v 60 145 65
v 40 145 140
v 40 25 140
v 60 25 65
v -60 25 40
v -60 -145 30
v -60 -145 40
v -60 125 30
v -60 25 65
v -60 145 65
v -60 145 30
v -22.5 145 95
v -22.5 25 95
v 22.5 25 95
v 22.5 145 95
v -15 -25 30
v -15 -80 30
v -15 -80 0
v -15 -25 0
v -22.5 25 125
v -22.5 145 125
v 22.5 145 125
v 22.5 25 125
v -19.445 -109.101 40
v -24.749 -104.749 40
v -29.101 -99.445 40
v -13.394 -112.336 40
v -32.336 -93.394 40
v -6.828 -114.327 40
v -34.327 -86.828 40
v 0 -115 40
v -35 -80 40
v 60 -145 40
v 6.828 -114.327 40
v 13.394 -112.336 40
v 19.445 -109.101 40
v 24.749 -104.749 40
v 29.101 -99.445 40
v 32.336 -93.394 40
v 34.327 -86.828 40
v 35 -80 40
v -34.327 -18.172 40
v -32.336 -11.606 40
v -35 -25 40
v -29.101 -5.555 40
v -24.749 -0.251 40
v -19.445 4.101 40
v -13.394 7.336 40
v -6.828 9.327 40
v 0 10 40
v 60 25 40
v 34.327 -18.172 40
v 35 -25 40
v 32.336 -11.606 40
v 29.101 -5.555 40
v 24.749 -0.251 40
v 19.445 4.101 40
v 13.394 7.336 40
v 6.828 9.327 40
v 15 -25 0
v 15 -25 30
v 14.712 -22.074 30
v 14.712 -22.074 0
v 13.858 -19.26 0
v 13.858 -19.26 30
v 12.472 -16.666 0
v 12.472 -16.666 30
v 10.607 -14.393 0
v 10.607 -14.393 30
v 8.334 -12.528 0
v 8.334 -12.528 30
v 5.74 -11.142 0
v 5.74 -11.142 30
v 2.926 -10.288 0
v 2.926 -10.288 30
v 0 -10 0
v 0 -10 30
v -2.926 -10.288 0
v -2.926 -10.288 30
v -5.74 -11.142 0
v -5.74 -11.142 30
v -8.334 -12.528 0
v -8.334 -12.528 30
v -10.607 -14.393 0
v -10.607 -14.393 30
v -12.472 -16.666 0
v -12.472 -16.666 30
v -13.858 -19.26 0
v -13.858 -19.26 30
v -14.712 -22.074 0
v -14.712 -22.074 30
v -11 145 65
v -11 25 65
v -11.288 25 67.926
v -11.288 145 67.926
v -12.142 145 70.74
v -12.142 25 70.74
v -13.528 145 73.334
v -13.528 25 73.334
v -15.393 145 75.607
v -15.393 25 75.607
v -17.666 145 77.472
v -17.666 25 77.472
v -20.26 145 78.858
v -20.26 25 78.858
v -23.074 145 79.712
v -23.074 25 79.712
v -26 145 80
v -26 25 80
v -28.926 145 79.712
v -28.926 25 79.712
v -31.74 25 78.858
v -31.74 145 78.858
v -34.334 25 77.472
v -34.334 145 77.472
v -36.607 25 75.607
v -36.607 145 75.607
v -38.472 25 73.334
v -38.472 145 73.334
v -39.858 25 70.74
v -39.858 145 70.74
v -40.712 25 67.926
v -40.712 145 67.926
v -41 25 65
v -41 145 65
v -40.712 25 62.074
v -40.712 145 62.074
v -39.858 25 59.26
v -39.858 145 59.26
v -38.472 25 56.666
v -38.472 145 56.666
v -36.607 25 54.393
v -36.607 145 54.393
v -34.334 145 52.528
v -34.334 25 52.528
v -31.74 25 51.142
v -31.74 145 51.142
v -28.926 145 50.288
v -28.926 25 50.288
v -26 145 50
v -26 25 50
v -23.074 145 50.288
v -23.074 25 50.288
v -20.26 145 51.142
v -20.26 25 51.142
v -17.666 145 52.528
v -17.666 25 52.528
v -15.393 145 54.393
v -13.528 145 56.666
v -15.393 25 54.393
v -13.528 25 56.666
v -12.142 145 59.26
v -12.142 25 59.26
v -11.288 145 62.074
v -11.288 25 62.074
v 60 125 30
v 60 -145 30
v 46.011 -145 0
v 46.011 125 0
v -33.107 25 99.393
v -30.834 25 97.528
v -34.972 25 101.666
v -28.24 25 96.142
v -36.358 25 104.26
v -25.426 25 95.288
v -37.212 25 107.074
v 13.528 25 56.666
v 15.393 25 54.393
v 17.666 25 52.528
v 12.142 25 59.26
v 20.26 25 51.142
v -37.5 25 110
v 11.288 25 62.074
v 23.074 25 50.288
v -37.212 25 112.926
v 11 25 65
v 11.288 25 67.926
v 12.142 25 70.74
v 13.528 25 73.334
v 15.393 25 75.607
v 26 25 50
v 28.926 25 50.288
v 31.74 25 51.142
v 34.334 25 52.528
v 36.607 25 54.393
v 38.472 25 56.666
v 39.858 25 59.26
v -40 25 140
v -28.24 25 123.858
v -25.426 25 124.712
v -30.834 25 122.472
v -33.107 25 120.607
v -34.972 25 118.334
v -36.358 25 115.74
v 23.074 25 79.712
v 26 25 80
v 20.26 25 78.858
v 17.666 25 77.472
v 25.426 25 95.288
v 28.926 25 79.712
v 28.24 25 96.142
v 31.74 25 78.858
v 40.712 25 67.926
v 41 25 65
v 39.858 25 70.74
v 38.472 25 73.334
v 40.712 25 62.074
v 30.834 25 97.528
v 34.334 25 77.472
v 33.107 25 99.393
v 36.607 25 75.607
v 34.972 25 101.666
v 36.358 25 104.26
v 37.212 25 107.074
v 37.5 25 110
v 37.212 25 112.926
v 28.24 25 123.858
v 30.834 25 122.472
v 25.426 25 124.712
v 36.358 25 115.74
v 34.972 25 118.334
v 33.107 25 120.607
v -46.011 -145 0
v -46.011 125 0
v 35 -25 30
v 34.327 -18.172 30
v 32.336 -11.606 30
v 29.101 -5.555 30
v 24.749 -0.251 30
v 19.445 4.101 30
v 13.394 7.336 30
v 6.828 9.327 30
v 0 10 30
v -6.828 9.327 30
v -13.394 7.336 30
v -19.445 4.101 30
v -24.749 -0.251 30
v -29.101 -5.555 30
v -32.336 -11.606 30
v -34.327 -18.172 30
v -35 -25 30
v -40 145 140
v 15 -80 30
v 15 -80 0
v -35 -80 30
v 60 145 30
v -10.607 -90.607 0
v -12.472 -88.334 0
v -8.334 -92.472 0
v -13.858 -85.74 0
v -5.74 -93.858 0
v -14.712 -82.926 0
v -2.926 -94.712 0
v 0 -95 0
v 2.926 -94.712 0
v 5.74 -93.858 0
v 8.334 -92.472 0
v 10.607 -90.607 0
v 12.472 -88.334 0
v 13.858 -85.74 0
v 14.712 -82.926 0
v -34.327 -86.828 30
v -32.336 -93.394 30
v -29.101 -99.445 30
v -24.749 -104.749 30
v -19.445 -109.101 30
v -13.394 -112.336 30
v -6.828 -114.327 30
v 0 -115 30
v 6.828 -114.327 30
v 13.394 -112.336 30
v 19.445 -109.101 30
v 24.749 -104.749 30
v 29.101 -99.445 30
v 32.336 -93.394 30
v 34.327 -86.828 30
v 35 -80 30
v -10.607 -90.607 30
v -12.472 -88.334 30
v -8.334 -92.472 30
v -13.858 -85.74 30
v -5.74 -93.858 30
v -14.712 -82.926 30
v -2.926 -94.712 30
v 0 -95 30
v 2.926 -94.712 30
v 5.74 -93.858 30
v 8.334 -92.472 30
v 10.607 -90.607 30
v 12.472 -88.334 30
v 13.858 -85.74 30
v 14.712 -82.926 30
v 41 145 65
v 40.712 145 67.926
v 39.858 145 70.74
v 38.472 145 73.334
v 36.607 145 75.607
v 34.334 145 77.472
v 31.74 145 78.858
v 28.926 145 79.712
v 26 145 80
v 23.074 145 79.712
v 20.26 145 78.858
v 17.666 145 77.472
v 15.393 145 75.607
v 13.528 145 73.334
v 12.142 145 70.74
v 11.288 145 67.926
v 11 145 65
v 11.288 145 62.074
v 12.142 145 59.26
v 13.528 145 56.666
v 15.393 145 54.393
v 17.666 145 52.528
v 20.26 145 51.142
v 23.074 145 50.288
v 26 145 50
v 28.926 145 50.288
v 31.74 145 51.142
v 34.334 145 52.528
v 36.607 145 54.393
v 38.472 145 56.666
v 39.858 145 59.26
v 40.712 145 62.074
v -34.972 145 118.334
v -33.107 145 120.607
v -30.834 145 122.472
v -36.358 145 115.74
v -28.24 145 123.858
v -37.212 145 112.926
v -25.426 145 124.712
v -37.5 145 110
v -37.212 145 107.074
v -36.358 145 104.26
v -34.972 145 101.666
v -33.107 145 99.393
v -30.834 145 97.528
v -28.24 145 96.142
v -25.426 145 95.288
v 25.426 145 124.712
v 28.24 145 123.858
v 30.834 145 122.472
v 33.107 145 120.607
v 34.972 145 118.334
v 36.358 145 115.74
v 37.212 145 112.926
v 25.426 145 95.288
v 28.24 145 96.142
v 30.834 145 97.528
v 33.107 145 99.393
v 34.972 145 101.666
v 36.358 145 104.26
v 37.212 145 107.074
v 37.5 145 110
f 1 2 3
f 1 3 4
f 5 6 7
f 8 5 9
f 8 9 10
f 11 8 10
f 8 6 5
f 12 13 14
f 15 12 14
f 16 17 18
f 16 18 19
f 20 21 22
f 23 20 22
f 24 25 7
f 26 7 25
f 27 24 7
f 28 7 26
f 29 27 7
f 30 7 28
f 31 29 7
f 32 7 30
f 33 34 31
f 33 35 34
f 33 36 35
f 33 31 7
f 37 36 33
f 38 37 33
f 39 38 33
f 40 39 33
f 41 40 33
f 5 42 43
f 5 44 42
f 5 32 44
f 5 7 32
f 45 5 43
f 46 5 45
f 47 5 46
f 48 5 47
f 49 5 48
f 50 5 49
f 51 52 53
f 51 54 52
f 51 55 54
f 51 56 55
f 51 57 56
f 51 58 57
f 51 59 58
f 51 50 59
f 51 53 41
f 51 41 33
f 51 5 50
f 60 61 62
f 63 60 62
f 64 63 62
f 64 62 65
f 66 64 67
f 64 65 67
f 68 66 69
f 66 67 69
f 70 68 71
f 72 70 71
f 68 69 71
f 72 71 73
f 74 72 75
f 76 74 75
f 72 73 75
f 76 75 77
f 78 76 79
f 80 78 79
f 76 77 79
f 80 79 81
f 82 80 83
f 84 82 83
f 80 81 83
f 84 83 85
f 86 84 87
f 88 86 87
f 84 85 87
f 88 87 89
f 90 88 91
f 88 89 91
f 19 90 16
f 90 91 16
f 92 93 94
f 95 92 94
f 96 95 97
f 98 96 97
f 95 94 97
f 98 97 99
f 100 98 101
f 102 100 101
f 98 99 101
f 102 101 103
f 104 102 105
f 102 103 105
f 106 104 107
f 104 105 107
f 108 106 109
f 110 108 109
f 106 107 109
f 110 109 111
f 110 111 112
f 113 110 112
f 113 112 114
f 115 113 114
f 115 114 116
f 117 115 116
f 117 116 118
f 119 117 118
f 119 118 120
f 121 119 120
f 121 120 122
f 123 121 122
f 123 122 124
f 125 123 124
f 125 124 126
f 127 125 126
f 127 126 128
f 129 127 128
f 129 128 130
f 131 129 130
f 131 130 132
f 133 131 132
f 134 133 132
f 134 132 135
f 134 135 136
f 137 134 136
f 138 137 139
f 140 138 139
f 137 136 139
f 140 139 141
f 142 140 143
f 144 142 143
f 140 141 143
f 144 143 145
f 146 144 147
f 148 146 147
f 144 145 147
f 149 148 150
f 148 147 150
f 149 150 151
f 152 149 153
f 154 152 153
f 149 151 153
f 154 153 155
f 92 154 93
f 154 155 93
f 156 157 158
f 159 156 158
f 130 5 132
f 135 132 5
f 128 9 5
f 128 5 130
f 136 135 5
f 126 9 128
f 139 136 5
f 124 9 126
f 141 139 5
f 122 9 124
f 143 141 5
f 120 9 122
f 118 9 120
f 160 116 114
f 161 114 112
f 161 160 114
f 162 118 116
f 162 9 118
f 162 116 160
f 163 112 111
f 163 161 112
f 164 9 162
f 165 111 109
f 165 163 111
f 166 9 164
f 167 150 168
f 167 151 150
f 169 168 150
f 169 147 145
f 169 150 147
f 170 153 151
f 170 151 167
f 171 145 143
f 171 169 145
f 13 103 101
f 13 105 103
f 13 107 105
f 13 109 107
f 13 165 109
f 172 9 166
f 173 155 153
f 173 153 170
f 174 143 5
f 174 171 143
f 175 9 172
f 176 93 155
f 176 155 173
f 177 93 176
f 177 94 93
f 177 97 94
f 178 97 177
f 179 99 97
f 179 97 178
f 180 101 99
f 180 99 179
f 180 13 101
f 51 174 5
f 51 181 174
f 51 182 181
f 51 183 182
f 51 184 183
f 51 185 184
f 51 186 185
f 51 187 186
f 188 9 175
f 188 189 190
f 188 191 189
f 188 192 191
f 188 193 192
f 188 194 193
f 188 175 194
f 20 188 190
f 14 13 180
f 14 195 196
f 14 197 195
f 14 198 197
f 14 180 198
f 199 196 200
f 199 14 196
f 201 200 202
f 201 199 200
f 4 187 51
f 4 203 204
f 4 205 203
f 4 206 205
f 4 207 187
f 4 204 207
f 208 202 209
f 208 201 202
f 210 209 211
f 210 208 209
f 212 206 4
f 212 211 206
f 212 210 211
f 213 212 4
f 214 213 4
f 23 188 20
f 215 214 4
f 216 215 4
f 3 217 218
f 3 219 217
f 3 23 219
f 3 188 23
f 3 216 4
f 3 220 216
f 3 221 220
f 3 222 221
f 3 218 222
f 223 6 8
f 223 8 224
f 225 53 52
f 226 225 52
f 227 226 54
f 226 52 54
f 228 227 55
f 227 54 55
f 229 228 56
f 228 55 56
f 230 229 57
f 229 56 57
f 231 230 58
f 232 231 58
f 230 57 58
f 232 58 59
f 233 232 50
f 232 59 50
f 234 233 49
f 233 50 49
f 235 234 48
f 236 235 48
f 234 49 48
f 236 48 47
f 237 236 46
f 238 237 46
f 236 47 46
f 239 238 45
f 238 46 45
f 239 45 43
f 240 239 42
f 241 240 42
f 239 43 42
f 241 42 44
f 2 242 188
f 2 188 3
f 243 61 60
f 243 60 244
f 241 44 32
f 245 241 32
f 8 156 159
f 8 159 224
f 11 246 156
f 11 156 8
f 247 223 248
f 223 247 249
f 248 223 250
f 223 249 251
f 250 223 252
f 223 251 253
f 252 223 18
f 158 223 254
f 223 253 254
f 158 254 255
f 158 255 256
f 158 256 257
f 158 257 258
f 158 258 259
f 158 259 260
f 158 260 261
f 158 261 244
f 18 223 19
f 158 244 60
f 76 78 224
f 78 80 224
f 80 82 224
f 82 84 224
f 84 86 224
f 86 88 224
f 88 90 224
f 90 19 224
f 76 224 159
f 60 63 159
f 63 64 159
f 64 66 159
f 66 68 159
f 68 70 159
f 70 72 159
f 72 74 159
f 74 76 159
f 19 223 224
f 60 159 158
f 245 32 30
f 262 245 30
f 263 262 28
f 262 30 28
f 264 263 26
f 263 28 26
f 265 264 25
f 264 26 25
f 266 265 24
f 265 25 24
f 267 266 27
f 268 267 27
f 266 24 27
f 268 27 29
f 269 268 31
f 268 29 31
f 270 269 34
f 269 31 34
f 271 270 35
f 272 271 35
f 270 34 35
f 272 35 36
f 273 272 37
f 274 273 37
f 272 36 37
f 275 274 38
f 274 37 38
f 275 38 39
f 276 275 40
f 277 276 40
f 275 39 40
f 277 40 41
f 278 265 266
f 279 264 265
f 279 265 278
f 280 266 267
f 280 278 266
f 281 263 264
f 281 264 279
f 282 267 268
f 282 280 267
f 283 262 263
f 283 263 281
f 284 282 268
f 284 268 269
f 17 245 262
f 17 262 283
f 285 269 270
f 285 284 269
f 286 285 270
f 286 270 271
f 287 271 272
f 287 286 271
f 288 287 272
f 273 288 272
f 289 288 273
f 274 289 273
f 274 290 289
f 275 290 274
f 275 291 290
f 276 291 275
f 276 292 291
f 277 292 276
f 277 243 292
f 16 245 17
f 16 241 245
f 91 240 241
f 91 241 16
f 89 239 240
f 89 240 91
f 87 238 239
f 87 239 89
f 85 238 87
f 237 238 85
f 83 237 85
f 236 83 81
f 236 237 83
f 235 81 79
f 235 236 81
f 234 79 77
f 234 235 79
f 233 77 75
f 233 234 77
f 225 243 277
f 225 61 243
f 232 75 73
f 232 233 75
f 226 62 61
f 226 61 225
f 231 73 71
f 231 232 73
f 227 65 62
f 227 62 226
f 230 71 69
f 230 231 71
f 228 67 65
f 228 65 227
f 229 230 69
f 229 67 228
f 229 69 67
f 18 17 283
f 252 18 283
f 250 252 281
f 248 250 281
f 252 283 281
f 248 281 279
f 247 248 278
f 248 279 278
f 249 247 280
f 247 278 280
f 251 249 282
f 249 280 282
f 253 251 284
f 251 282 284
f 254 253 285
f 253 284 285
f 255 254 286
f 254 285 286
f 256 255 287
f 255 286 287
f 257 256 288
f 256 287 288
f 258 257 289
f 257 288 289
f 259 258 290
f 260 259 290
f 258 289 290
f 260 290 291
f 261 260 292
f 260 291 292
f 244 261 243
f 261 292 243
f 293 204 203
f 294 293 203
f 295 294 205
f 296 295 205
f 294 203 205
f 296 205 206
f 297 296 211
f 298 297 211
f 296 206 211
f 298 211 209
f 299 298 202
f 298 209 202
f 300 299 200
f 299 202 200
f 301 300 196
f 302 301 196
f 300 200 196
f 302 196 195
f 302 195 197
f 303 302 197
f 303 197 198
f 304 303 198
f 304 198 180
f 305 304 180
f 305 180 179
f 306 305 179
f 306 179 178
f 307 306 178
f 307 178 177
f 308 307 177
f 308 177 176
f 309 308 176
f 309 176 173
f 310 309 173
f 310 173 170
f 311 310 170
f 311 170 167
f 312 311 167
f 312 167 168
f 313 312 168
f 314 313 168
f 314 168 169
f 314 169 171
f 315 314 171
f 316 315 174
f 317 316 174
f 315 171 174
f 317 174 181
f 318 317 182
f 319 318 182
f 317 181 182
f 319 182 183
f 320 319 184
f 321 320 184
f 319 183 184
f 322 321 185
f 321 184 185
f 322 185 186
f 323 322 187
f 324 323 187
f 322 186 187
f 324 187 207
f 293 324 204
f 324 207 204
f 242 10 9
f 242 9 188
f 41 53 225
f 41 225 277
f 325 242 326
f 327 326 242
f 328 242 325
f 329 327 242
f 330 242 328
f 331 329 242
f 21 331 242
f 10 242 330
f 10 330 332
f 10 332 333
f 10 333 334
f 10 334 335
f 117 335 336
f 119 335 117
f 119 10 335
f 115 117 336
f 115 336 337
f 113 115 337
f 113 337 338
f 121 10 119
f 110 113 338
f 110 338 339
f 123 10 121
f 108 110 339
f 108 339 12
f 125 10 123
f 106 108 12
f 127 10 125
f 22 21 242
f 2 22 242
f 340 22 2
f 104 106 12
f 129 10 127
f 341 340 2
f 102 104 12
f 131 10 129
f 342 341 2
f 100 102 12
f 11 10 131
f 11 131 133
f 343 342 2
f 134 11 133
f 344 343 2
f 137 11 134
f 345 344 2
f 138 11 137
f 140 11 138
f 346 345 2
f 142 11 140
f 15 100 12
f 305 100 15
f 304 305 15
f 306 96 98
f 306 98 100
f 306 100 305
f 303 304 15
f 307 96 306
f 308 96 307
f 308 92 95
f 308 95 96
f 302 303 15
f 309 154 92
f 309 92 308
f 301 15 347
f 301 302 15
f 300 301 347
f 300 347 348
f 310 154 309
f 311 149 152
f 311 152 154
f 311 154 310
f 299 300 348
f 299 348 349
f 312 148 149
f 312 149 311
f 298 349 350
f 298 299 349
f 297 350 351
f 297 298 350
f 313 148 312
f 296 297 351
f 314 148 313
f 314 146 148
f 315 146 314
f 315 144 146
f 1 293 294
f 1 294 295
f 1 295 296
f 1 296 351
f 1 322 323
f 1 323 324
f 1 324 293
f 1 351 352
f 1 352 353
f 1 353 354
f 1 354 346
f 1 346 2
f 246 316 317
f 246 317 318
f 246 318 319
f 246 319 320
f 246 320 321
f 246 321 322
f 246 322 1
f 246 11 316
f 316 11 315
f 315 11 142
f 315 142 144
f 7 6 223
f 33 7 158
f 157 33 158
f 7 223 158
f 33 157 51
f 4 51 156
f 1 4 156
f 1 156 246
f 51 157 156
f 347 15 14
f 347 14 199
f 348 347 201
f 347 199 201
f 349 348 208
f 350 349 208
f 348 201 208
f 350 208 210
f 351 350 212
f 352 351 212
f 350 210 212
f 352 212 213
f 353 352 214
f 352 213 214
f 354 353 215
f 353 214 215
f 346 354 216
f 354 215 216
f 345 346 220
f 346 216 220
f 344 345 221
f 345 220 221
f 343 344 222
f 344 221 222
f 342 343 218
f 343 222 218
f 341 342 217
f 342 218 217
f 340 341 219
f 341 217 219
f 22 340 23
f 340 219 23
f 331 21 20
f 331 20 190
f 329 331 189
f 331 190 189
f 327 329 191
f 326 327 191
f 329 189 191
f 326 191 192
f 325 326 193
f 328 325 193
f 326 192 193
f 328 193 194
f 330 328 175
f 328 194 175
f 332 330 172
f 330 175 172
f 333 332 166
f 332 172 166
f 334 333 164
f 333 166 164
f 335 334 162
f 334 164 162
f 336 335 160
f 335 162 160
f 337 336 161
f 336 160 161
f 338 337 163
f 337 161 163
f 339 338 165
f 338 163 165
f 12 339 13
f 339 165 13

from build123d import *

# Parameters (mm, degrees)
SKETCH_W        = 120
SKETCH_H        = 290
PAD_DEPTH       = 140
SKETCH001_W     = 120
SKETCH001_H     = 170
POCKET_DEPTH    = 100
POCKET001_DEPTH = 120.001
SKETCH003_R     = 15
POCKET002_DEPTH = 120.001
POCKET003_DEPTH = 290.001
SKETCH005_W     = 120
SKETCH005_H     = 30
POCKET004_DEPTH = 20
POCKET005_DEPTH = 40.001
POCKET006_DEPTH = 10


with BuildPart() as part:
    # Sketch → Pad (new body)
    with BuildSketch(Plane.XY):
        Rectangle(SKETCH_W, SKETCH_H)
    extrude(amount=PAD_DEPTH)

    # Sketch001 → Pocket (cut)
    with BuildSketch(Plane.XY.offset(140)):
        with Locations((0, -60)):
            Rectangle(SKETCH001_W, SKETCH001_H)
    extrude(amount=-POCKET_DEPTH, mode=Mode.SUBTRACT)

    # Sketch002 → Pocket001 (cut, through all)
    with BuildSketch(Plane.XZ.offset(-25)):
        Polygon((40, 140), (60, 65), (60, 140), align=None)
        Polygon((-60, 65), (-40, 140), (-60, 140), align=None)
    extrude(amount=-POCKET001_DEPTH, mode=Mode.SUBTRACT)

    # Sketch003 → Pocket002 (cut, through all)
    with BuildSketch(Plane.XZ.offset(-25)):
        with Locations((-26, 65)):
            Circle(SKETCH003_R)
        with Locations((26, 65)):
            Circle(SKETCH003_R)
        with BuildLine():
            ThreePointArc((-22.499959, 125), (-37.5, 110.000021), (-22.5, 95))
            Line((-22.5, 95), (22.5, 95))
            ThreePointArc((22.5, 95), (37.5, 110.000021), (22.499959, 125))
            Line((-22.499959, 125), (22.499959, 125))
        make_face()
    extrude(amount=-POCKET002_DEPTH, mode=Mode.SUBTRACT)

    # Sketch004 → Pocket003 (cut, through all)
    with BuildSketch(Plane.XZ.offset(145)):
        Polygon((-60, 30), (-46.01077, 0), (-60, 0), align=None)
        Polygon((60, 30), (46.01077, 0), (60, 0), align=None)
    extrude(amount=-POCKET003_DEPTH, mode=Mode.SUBTRACT)

    # Sketch005 → Pocket004 (cut)
    with BuildSketch(Plane(origin=(0, 145, 0), x_dir=(-1, 0, 0), z_dir=(0, 1, 0))):
        with Locations((0, 15)):
            Rectangle(SKETCH005_W, SKETCH005_H)
    extrude(amount=-POCKET004_DEPTH, mode=Mode.SUBTRACT)

    # Sketch006 → Pocket005 (cut, through all)
    with BuildSketch(Plane.XY.offset(40)):
        with BuildLine():
            ThreePointArc((15, -24.999997), (-2.5e-05, -10), (-15, -25.000048))
            Line((-15, -80.000045), (-15, -25.000048))
            ThreePointArc((-15, -80.000045), (2.3e-05, -95), (15, -79.999998))
            Line((15, -24.999997), (15, -79.999998))
        make_face()
    extrude(amount=-POCKET005_DEPTH, mode=Mode.SUBTRACT)

    # Sketch007 → Pocket006 (cut)
    with BuildSketch(Plane.XY.offset(40)):
        with BuildLine():
            ThreePointArc((35, -25), (-2.1e-05, 10), (-35, -25.000043))
            Line((-35, -25.000043), (-35, -79.999957))
            ThreePointArc((-35, -79.999957), (-2.1e-05, -115), (35, -80))
            Line((35, -25), (35, -80))
        make_face()
    extrude(amount=-POCKET006_DEPTH, mode=Mode.SUBTRACT)


solid = part.part
